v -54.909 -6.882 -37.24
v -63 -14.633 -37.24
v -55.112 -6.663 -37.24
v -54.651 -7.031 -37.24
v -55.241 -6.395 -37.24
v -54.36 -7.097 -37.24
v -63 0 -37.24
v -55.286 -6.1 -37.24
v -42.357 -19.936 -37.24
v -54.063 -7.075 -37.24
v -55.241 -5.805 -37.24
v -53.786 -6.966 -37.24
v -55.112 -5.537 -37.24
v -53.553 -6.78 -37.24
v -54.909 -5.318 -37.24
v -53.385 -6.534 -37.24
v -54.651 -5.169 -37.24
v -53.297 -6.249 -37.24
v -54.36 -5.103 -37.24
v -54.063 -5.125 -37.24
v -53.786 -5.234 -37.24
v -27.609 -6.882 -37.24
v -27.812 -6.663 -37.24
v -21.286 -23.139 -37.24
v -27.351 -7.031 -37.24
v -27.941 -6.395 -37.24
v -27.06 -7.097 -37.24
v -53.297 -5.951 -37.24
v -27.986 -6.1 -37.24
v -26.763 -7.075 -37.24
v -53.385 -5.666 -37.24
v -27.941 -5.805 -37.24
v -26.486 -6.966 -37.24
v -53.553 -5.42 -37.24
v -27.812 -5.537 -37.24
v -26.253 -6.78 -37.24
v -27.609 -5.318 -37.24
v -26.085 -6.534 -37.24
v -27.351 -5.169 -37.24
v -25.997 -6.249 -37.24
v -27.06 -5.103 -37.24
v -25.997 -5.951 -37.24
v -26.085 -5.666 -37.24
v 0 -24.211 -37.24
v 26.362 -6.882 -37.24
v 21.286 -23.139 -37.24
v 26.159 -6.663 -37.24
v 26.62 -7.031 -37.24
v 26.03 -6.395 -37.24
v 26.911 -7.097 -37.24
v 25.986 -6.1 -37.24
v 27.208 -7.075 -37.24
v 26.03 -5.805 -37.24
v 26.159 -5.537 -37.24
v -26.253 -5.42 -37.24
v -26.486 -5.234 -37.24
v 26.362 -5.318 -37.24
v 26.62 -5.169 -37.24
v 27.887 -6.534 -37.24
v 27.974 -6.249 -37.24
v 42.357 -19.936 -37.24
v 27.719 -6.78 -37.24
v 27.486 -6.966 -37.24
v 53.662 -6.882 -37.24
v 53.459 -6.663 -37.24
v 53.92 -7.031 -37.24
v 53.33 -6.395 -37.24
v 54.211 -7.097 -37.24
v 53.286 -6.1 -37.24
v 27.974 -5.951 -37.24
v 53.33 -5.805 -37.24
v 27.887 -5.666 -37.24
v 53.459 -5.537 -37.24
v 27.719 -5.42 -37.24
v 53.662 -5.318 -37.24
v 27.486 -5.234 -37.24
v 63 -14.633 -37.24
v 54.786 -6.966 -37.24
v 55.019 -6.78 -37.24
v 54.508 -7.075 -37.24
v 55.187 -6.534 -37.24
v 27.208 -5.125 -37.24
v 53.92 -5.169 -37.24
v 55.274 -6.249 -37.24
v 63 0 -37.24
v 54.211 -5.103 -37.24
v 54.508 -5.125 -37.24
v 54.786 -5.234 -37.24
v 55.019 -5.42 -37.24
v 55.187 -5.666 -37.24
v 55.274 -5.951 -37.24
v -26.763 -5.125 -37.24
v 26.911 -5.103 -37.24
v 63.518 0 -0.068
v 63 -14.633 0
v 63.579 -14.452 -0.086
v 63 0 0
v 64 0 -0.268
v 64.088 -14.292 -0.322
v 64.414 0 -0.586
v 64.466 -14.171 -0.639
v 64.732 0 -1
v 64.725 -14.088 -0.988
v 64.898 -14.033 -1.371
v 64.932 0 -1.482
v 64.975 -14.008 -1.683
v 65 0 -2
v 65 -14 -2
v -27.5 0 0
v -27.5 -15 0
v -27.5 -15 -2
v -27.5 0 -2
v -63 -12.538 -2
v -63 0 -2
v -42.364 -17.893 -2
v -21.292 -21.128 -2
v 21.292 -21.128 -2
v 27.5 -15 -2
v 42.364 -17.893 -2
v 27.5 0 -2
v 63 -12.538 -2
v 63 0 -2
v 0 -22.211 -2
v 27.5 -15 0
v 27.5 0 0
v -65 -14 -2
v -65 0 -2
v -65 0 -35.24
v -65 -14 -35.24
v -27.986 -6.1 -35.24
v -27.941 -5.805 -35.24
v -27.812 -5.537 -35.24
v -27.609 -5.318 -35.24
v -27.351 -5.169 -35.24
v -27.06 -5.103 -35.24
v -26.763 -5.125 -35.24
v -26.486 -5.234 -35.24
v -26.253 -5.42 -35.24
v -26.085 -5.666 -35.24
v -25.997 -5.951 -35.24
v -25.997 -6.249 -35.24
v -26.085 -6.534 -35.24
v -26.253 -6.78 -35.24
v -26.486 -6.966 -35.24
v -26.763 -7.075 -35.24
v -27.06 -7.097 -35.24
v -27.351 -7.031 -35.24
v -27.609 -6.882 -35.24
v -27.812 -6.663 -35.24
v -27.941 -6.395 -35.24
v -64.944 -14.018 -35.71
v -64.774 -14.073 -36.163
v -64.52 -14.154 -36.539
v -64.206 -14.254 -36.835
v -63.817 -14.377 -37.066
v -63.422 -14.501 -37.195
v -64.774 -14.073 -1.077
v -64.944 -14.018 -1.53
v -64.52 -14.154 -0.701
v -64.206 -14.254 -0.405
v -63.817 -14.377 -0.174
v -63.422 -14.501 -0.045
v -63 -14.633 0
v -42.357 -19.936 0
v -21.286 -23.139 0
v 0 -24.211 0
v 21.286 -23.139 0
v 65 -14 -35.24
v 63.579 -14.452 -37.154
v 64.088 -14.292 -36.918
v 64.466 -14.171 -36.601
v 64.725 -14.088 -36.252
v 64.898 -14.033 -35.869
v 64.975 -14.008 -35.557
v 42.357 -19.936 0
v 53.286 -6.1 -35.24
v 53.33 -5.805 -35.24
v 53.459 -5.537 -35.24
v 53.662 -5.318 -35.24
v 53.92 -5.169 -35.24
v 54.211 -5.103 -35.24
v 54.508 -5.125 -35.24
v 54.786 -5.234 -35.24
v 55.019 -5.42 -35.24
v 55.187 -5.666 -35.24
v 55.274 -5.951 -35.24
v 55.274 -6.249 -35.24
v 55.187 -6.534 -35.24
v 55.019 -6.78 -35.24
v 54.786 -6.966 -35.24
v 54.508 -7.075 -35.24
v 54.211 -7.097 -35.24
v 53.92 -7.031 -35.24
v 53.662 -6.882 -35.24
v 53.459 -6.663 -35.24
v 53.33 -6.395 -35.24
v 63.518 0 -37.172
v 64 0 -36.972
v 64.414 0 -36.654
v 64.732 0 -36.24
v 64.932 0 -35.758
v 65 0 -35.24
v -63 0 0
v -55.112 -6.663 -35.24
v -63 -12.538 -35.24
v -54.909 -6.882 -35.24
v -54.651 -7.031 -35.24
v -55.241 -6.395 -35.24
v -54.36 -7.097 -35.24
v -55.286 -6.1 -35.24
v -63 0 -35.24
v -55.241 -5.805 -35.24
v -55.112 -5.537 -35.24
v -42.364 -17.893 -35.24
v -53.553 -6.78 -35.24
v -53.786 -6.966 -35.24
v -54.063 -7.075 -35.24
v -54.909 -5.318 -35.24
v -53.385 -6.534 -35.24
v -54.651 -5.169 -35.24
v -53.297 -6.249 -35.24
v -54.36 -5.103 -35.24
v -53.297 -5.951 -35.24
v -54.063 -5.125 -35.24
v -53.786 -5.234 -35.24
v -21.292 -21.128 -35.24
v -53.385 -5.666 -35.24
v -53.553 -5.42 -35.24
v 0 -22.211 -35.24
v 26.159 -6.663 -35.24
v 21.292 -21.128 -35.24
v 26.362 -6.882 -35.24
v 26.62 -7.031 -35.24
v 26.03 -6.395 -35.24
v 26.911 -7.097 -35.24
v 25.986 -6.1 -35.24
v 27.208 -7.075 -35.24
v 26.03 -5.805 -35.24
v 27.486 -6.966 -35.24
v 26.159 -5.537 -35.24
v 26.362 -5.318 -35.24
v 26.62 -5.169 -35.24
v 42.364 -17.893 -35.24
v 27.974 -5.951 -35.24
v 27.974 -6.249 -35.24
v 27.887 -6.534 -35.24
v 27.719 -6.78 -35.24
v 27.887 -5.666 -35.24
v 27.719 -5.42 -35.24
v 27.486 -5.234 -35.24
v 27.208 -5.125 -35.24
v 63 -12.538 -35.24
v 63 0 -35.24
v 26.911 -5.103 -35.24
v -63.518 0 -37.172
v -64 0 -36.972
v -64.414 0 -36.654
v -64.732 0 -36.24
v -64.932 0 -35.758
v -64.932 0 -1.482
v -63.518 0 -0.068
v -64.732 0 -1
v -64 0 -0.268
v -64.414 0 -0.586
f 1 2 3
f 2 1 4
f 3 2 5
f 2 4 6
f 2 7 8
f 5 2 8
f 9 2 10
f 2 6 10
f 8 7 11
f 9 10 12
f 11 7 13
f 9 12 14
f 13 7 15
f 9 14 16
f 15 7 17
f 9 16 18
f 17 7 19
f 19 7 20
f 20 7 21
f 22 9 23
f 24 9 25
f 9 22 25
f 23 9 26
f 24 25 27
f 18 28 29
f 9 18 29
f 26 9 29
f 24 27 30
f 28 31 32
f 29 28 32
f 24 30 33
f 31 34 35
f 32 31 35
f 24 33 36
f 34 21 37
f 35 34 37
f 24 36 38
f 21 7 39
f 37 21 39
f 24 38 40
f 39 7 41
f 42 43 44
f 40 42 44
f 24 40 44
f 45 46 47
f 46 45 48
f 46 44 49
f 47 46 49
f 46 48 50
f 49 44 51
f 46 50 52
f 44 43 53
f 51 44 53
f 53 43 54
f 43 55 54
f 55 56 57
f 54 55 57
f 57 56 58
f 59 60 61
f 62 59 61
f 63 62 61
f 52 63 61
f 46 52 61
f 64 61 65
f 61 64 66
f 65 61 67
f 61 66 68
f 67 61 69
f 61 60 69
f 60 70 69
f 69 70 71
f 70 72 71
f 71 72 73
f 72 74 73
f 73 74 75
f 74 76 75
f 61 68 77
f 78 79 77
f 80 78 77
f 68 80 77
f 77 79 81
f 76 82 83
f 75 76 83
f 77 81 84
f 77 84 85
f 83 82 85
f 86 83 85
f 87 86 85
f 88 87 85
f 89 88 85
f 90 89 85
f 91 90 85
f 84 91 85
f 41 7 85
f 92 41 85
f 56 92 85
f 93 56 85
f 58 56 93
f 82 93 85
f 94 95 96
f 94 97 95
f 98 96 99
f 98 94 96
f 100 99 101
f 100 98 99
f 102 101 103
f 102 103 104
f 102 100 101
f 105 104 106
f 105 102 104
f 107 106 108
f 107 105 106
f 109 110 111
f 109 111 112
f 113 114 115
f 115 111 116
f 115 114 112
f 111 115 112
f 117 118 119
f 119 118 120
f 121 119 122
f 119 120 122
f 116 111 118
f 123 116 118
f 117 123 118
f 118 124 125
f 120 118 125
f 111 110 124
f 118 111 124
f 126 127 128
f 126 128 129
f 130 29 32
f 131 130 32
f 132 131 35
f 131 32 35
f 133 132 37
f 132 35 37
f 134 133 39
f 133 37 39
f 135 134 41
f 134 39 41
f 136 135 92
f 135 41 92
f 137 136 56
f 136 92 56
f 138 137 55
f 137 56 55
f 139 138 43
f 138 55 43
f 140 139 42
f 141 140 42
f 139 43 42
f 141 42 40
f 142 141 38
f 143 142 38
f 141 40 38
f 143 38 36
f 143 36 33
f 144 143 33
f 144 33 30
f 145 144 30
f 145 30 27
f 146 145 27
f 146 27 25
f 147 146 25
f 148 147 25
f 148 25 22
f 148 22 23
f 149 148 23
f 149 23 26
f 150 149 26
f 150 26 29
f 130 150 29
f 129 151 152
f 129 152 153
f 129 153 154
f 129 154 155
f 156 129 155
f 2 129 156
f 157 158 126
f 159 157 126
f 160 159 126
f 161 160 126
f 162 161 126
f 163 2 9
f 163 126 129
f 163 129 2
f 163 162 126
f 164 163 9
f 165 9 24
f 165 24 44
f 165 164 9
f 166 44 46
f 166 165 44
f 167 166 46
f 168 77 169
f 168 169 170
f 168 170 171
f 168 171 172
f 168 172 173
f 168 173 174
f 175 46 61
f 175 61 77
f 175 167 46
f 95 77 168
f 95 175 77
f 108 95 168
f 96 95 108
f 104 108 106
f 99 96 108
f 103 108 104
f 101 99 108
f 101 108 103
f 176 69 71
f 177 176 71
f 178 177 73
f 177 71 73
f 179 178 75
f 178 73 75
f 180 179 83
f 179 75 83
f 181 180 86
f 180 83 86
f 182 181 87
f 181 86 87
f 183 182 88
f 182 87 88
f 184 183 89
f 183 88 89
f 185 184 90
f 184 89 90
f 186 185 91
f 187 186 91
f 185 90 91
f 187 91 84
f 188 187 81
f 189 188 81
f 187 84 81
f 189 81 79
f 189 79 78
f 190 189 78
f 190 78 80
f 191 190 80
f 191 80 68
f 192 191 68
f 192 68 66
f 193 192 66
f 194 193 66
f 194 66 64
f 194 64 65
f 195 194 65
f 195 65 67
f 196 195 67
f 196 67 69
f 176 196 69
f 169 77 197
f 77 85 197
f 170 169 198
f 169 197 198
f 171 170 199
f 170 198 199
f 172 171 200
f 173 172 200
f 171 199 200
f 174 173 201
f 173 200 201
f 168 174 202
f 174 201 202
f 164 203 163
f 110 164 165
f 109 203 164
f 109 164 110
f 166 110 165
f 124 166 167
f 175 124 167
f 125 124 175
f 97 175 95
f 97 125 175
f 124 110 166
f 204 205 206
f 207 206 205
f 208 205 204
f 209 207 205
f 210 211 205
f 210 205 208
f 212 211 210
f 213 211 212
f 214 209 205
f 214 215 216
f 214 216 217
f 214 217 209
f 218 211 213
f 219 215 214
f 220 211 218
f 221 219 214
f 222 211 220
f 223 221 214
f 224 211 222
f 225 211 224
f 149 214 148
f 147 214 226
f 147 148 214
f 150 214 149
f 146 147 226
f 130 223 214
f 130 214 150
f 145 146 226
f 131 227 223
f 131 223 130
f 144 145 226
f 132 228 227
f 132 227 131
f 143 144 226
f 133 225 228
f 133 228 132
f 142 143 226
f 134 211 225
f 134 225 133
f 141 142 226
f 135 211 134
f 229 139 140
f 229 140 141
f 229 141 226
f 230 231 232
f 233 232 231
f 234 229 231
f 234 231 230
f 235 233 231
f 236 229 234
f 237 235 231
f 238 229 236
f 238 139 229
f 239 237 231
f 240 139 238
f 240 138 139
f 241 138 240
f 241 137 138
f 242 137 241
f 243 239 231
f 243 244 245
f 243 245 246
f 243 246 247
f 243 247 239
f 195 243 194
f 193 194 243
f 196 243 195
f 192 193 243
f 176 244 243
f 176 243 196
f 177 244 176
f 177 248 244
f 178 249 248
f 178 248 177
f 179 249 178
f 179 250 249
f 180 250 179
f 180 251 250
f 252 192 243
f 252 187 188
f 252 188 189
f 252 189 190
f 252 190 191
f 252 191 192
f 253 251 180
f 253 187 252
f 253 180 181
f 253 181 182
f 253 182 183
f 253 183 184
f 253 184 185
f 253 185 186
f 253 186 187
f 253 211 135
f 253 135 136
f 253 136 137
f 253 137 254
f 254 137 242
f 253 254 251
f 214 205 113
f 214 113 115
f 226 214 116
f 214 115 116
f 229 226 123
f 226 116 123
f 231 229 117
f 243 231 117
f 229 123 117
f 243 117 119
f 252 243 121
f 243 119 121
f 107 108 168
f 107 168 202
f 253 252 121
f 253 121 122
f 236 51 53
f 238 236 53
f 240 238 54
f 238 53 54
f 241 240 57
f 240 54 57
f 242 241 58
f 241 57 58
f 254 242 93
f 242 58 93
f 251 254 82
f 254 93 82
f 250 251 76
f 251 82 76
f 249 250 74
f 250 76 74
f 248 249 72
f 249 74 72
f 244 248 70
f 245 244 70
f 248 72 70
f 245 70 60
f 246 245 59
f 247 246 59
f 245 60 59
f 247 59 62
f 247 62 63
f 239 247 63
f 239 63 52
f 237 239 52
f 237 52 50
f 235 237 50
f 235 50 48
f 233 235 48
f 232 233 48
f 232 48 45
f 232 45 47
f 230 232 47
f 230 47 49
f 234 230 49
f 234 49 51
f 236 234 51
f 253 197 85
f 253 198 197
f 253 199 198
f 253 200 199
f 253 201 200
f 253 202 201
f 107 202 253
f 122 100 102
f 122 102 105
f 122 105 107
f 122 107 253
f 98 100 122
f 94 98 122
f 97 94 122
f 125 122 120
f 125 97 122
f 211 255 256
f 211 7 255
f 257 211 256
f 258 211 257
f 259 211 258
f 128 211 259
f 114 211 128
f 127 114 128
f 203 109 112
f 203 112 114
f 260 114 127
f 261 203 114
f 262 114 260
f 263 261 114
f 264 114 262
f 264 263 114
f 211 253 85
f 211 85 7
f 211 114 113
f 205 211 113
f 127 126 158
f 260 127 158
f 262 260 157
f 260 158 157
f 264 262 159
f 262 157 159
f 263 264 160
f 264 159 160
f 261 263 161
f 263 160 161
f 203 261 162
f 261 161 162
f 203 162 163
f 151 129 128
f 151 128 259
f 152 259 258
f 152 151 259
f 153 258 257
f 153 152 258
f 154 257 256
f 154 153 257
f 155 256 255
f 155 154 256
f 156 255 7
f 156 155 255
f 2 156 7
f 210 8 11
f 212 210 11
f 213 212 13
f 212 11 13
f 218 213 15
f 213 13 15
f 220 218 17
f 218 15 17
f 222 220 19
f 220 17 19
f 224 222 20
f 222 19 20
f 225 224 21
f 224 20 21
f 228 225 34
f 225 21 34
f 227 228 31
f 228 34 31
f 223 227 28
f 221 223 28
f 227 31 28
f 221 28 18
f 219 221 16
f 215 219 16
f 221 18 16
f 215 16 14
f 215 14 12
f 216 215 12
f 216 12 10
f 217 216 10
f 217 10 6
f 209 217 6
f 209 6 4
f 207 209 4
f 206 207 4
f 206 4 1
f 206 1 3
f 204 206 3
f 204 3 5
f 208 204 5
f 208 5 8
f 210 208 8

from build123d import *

# Parameters (mm, degrees)
BOSS_EXTRUDE1_DEPTH = 37.24
SHELL1_T            = -2
SKETCH2_W           = 55
SKETCH2_H           = 15
CUT_EXTRUDE1_DEPTH  = 10
SKETCH3_R           = 1
CUT_EXTRUDE2_DEPTH  = 12
FILLET1_R           = 2


with BuildPart() as part:
    # Sketch1 → Boss-Extrude1 (new body)
    with BuildSketch(Plane.XY):
        with BuildLine():
            Line((65, 0), (-65, 0))
            Line((-65, 0), (-65, -14))
            ThreePointArc((-65, -14), (0, -24.210505724), (65, -14))
            Line((65, -14), (65, 0))
        make_face()
    extrude(amount=-BOSS_EXTRUDE1_DEPTH)

    # Shell1
    shell1_openings = [part.faces().sort_by_distance(p)[0] for p in [
        (0, 0, -18.62),
    ]]
    offset(amount=SHELL1_T, openings=shell1_openings, kind=Kind.INTERSECTION)

    # Sketch2 → Cut-Extrude1 (cut)
    with BuildSketch(Plane.XY):
        with Locations((0, -7.5)):
            Rectangle(SKETCH2_W, SKETCH2_H)
    extrude(amount=-CUT_EXTRUDE1_DEPTH, mode=Mode.SUBTRACT)

    # Sketch3 → Cut-Extrude2 (cut)
    with BuildSketch(Plane(origin=(0, 0, -37.24), x_dir=(-1, 0, 0), z_dir=(0, 0, -1))):
        with Locations((-54.285626074, -6.1)):
            Circle(SKETCH3_R)
        with Locations((-26.985626074, -6.1)):
            Circle(SKETCH3_R)
        with Locations((54.285626074, -6.1)):
            Circle(SKETCH3_R)
        with Locations((26.985626074, -6.1)):
            Circle(SKETCH3_R)
    extrude(amount=-CUT_EXTRUDE2_DEPTH, mode=Mode.SUBTRACT)

    # Fillet1
    fillet1_edges = [part.edges().sort_by_distance(p)[0] for p in [
        (65, -7, -37.24),
        (-65, -7, -37.24),
        (65, -7, 0),
        (-65, -7, 0),
    ]]
    fillet(fillet1_edges, radius=FILLET1_R)


solid = part.part
